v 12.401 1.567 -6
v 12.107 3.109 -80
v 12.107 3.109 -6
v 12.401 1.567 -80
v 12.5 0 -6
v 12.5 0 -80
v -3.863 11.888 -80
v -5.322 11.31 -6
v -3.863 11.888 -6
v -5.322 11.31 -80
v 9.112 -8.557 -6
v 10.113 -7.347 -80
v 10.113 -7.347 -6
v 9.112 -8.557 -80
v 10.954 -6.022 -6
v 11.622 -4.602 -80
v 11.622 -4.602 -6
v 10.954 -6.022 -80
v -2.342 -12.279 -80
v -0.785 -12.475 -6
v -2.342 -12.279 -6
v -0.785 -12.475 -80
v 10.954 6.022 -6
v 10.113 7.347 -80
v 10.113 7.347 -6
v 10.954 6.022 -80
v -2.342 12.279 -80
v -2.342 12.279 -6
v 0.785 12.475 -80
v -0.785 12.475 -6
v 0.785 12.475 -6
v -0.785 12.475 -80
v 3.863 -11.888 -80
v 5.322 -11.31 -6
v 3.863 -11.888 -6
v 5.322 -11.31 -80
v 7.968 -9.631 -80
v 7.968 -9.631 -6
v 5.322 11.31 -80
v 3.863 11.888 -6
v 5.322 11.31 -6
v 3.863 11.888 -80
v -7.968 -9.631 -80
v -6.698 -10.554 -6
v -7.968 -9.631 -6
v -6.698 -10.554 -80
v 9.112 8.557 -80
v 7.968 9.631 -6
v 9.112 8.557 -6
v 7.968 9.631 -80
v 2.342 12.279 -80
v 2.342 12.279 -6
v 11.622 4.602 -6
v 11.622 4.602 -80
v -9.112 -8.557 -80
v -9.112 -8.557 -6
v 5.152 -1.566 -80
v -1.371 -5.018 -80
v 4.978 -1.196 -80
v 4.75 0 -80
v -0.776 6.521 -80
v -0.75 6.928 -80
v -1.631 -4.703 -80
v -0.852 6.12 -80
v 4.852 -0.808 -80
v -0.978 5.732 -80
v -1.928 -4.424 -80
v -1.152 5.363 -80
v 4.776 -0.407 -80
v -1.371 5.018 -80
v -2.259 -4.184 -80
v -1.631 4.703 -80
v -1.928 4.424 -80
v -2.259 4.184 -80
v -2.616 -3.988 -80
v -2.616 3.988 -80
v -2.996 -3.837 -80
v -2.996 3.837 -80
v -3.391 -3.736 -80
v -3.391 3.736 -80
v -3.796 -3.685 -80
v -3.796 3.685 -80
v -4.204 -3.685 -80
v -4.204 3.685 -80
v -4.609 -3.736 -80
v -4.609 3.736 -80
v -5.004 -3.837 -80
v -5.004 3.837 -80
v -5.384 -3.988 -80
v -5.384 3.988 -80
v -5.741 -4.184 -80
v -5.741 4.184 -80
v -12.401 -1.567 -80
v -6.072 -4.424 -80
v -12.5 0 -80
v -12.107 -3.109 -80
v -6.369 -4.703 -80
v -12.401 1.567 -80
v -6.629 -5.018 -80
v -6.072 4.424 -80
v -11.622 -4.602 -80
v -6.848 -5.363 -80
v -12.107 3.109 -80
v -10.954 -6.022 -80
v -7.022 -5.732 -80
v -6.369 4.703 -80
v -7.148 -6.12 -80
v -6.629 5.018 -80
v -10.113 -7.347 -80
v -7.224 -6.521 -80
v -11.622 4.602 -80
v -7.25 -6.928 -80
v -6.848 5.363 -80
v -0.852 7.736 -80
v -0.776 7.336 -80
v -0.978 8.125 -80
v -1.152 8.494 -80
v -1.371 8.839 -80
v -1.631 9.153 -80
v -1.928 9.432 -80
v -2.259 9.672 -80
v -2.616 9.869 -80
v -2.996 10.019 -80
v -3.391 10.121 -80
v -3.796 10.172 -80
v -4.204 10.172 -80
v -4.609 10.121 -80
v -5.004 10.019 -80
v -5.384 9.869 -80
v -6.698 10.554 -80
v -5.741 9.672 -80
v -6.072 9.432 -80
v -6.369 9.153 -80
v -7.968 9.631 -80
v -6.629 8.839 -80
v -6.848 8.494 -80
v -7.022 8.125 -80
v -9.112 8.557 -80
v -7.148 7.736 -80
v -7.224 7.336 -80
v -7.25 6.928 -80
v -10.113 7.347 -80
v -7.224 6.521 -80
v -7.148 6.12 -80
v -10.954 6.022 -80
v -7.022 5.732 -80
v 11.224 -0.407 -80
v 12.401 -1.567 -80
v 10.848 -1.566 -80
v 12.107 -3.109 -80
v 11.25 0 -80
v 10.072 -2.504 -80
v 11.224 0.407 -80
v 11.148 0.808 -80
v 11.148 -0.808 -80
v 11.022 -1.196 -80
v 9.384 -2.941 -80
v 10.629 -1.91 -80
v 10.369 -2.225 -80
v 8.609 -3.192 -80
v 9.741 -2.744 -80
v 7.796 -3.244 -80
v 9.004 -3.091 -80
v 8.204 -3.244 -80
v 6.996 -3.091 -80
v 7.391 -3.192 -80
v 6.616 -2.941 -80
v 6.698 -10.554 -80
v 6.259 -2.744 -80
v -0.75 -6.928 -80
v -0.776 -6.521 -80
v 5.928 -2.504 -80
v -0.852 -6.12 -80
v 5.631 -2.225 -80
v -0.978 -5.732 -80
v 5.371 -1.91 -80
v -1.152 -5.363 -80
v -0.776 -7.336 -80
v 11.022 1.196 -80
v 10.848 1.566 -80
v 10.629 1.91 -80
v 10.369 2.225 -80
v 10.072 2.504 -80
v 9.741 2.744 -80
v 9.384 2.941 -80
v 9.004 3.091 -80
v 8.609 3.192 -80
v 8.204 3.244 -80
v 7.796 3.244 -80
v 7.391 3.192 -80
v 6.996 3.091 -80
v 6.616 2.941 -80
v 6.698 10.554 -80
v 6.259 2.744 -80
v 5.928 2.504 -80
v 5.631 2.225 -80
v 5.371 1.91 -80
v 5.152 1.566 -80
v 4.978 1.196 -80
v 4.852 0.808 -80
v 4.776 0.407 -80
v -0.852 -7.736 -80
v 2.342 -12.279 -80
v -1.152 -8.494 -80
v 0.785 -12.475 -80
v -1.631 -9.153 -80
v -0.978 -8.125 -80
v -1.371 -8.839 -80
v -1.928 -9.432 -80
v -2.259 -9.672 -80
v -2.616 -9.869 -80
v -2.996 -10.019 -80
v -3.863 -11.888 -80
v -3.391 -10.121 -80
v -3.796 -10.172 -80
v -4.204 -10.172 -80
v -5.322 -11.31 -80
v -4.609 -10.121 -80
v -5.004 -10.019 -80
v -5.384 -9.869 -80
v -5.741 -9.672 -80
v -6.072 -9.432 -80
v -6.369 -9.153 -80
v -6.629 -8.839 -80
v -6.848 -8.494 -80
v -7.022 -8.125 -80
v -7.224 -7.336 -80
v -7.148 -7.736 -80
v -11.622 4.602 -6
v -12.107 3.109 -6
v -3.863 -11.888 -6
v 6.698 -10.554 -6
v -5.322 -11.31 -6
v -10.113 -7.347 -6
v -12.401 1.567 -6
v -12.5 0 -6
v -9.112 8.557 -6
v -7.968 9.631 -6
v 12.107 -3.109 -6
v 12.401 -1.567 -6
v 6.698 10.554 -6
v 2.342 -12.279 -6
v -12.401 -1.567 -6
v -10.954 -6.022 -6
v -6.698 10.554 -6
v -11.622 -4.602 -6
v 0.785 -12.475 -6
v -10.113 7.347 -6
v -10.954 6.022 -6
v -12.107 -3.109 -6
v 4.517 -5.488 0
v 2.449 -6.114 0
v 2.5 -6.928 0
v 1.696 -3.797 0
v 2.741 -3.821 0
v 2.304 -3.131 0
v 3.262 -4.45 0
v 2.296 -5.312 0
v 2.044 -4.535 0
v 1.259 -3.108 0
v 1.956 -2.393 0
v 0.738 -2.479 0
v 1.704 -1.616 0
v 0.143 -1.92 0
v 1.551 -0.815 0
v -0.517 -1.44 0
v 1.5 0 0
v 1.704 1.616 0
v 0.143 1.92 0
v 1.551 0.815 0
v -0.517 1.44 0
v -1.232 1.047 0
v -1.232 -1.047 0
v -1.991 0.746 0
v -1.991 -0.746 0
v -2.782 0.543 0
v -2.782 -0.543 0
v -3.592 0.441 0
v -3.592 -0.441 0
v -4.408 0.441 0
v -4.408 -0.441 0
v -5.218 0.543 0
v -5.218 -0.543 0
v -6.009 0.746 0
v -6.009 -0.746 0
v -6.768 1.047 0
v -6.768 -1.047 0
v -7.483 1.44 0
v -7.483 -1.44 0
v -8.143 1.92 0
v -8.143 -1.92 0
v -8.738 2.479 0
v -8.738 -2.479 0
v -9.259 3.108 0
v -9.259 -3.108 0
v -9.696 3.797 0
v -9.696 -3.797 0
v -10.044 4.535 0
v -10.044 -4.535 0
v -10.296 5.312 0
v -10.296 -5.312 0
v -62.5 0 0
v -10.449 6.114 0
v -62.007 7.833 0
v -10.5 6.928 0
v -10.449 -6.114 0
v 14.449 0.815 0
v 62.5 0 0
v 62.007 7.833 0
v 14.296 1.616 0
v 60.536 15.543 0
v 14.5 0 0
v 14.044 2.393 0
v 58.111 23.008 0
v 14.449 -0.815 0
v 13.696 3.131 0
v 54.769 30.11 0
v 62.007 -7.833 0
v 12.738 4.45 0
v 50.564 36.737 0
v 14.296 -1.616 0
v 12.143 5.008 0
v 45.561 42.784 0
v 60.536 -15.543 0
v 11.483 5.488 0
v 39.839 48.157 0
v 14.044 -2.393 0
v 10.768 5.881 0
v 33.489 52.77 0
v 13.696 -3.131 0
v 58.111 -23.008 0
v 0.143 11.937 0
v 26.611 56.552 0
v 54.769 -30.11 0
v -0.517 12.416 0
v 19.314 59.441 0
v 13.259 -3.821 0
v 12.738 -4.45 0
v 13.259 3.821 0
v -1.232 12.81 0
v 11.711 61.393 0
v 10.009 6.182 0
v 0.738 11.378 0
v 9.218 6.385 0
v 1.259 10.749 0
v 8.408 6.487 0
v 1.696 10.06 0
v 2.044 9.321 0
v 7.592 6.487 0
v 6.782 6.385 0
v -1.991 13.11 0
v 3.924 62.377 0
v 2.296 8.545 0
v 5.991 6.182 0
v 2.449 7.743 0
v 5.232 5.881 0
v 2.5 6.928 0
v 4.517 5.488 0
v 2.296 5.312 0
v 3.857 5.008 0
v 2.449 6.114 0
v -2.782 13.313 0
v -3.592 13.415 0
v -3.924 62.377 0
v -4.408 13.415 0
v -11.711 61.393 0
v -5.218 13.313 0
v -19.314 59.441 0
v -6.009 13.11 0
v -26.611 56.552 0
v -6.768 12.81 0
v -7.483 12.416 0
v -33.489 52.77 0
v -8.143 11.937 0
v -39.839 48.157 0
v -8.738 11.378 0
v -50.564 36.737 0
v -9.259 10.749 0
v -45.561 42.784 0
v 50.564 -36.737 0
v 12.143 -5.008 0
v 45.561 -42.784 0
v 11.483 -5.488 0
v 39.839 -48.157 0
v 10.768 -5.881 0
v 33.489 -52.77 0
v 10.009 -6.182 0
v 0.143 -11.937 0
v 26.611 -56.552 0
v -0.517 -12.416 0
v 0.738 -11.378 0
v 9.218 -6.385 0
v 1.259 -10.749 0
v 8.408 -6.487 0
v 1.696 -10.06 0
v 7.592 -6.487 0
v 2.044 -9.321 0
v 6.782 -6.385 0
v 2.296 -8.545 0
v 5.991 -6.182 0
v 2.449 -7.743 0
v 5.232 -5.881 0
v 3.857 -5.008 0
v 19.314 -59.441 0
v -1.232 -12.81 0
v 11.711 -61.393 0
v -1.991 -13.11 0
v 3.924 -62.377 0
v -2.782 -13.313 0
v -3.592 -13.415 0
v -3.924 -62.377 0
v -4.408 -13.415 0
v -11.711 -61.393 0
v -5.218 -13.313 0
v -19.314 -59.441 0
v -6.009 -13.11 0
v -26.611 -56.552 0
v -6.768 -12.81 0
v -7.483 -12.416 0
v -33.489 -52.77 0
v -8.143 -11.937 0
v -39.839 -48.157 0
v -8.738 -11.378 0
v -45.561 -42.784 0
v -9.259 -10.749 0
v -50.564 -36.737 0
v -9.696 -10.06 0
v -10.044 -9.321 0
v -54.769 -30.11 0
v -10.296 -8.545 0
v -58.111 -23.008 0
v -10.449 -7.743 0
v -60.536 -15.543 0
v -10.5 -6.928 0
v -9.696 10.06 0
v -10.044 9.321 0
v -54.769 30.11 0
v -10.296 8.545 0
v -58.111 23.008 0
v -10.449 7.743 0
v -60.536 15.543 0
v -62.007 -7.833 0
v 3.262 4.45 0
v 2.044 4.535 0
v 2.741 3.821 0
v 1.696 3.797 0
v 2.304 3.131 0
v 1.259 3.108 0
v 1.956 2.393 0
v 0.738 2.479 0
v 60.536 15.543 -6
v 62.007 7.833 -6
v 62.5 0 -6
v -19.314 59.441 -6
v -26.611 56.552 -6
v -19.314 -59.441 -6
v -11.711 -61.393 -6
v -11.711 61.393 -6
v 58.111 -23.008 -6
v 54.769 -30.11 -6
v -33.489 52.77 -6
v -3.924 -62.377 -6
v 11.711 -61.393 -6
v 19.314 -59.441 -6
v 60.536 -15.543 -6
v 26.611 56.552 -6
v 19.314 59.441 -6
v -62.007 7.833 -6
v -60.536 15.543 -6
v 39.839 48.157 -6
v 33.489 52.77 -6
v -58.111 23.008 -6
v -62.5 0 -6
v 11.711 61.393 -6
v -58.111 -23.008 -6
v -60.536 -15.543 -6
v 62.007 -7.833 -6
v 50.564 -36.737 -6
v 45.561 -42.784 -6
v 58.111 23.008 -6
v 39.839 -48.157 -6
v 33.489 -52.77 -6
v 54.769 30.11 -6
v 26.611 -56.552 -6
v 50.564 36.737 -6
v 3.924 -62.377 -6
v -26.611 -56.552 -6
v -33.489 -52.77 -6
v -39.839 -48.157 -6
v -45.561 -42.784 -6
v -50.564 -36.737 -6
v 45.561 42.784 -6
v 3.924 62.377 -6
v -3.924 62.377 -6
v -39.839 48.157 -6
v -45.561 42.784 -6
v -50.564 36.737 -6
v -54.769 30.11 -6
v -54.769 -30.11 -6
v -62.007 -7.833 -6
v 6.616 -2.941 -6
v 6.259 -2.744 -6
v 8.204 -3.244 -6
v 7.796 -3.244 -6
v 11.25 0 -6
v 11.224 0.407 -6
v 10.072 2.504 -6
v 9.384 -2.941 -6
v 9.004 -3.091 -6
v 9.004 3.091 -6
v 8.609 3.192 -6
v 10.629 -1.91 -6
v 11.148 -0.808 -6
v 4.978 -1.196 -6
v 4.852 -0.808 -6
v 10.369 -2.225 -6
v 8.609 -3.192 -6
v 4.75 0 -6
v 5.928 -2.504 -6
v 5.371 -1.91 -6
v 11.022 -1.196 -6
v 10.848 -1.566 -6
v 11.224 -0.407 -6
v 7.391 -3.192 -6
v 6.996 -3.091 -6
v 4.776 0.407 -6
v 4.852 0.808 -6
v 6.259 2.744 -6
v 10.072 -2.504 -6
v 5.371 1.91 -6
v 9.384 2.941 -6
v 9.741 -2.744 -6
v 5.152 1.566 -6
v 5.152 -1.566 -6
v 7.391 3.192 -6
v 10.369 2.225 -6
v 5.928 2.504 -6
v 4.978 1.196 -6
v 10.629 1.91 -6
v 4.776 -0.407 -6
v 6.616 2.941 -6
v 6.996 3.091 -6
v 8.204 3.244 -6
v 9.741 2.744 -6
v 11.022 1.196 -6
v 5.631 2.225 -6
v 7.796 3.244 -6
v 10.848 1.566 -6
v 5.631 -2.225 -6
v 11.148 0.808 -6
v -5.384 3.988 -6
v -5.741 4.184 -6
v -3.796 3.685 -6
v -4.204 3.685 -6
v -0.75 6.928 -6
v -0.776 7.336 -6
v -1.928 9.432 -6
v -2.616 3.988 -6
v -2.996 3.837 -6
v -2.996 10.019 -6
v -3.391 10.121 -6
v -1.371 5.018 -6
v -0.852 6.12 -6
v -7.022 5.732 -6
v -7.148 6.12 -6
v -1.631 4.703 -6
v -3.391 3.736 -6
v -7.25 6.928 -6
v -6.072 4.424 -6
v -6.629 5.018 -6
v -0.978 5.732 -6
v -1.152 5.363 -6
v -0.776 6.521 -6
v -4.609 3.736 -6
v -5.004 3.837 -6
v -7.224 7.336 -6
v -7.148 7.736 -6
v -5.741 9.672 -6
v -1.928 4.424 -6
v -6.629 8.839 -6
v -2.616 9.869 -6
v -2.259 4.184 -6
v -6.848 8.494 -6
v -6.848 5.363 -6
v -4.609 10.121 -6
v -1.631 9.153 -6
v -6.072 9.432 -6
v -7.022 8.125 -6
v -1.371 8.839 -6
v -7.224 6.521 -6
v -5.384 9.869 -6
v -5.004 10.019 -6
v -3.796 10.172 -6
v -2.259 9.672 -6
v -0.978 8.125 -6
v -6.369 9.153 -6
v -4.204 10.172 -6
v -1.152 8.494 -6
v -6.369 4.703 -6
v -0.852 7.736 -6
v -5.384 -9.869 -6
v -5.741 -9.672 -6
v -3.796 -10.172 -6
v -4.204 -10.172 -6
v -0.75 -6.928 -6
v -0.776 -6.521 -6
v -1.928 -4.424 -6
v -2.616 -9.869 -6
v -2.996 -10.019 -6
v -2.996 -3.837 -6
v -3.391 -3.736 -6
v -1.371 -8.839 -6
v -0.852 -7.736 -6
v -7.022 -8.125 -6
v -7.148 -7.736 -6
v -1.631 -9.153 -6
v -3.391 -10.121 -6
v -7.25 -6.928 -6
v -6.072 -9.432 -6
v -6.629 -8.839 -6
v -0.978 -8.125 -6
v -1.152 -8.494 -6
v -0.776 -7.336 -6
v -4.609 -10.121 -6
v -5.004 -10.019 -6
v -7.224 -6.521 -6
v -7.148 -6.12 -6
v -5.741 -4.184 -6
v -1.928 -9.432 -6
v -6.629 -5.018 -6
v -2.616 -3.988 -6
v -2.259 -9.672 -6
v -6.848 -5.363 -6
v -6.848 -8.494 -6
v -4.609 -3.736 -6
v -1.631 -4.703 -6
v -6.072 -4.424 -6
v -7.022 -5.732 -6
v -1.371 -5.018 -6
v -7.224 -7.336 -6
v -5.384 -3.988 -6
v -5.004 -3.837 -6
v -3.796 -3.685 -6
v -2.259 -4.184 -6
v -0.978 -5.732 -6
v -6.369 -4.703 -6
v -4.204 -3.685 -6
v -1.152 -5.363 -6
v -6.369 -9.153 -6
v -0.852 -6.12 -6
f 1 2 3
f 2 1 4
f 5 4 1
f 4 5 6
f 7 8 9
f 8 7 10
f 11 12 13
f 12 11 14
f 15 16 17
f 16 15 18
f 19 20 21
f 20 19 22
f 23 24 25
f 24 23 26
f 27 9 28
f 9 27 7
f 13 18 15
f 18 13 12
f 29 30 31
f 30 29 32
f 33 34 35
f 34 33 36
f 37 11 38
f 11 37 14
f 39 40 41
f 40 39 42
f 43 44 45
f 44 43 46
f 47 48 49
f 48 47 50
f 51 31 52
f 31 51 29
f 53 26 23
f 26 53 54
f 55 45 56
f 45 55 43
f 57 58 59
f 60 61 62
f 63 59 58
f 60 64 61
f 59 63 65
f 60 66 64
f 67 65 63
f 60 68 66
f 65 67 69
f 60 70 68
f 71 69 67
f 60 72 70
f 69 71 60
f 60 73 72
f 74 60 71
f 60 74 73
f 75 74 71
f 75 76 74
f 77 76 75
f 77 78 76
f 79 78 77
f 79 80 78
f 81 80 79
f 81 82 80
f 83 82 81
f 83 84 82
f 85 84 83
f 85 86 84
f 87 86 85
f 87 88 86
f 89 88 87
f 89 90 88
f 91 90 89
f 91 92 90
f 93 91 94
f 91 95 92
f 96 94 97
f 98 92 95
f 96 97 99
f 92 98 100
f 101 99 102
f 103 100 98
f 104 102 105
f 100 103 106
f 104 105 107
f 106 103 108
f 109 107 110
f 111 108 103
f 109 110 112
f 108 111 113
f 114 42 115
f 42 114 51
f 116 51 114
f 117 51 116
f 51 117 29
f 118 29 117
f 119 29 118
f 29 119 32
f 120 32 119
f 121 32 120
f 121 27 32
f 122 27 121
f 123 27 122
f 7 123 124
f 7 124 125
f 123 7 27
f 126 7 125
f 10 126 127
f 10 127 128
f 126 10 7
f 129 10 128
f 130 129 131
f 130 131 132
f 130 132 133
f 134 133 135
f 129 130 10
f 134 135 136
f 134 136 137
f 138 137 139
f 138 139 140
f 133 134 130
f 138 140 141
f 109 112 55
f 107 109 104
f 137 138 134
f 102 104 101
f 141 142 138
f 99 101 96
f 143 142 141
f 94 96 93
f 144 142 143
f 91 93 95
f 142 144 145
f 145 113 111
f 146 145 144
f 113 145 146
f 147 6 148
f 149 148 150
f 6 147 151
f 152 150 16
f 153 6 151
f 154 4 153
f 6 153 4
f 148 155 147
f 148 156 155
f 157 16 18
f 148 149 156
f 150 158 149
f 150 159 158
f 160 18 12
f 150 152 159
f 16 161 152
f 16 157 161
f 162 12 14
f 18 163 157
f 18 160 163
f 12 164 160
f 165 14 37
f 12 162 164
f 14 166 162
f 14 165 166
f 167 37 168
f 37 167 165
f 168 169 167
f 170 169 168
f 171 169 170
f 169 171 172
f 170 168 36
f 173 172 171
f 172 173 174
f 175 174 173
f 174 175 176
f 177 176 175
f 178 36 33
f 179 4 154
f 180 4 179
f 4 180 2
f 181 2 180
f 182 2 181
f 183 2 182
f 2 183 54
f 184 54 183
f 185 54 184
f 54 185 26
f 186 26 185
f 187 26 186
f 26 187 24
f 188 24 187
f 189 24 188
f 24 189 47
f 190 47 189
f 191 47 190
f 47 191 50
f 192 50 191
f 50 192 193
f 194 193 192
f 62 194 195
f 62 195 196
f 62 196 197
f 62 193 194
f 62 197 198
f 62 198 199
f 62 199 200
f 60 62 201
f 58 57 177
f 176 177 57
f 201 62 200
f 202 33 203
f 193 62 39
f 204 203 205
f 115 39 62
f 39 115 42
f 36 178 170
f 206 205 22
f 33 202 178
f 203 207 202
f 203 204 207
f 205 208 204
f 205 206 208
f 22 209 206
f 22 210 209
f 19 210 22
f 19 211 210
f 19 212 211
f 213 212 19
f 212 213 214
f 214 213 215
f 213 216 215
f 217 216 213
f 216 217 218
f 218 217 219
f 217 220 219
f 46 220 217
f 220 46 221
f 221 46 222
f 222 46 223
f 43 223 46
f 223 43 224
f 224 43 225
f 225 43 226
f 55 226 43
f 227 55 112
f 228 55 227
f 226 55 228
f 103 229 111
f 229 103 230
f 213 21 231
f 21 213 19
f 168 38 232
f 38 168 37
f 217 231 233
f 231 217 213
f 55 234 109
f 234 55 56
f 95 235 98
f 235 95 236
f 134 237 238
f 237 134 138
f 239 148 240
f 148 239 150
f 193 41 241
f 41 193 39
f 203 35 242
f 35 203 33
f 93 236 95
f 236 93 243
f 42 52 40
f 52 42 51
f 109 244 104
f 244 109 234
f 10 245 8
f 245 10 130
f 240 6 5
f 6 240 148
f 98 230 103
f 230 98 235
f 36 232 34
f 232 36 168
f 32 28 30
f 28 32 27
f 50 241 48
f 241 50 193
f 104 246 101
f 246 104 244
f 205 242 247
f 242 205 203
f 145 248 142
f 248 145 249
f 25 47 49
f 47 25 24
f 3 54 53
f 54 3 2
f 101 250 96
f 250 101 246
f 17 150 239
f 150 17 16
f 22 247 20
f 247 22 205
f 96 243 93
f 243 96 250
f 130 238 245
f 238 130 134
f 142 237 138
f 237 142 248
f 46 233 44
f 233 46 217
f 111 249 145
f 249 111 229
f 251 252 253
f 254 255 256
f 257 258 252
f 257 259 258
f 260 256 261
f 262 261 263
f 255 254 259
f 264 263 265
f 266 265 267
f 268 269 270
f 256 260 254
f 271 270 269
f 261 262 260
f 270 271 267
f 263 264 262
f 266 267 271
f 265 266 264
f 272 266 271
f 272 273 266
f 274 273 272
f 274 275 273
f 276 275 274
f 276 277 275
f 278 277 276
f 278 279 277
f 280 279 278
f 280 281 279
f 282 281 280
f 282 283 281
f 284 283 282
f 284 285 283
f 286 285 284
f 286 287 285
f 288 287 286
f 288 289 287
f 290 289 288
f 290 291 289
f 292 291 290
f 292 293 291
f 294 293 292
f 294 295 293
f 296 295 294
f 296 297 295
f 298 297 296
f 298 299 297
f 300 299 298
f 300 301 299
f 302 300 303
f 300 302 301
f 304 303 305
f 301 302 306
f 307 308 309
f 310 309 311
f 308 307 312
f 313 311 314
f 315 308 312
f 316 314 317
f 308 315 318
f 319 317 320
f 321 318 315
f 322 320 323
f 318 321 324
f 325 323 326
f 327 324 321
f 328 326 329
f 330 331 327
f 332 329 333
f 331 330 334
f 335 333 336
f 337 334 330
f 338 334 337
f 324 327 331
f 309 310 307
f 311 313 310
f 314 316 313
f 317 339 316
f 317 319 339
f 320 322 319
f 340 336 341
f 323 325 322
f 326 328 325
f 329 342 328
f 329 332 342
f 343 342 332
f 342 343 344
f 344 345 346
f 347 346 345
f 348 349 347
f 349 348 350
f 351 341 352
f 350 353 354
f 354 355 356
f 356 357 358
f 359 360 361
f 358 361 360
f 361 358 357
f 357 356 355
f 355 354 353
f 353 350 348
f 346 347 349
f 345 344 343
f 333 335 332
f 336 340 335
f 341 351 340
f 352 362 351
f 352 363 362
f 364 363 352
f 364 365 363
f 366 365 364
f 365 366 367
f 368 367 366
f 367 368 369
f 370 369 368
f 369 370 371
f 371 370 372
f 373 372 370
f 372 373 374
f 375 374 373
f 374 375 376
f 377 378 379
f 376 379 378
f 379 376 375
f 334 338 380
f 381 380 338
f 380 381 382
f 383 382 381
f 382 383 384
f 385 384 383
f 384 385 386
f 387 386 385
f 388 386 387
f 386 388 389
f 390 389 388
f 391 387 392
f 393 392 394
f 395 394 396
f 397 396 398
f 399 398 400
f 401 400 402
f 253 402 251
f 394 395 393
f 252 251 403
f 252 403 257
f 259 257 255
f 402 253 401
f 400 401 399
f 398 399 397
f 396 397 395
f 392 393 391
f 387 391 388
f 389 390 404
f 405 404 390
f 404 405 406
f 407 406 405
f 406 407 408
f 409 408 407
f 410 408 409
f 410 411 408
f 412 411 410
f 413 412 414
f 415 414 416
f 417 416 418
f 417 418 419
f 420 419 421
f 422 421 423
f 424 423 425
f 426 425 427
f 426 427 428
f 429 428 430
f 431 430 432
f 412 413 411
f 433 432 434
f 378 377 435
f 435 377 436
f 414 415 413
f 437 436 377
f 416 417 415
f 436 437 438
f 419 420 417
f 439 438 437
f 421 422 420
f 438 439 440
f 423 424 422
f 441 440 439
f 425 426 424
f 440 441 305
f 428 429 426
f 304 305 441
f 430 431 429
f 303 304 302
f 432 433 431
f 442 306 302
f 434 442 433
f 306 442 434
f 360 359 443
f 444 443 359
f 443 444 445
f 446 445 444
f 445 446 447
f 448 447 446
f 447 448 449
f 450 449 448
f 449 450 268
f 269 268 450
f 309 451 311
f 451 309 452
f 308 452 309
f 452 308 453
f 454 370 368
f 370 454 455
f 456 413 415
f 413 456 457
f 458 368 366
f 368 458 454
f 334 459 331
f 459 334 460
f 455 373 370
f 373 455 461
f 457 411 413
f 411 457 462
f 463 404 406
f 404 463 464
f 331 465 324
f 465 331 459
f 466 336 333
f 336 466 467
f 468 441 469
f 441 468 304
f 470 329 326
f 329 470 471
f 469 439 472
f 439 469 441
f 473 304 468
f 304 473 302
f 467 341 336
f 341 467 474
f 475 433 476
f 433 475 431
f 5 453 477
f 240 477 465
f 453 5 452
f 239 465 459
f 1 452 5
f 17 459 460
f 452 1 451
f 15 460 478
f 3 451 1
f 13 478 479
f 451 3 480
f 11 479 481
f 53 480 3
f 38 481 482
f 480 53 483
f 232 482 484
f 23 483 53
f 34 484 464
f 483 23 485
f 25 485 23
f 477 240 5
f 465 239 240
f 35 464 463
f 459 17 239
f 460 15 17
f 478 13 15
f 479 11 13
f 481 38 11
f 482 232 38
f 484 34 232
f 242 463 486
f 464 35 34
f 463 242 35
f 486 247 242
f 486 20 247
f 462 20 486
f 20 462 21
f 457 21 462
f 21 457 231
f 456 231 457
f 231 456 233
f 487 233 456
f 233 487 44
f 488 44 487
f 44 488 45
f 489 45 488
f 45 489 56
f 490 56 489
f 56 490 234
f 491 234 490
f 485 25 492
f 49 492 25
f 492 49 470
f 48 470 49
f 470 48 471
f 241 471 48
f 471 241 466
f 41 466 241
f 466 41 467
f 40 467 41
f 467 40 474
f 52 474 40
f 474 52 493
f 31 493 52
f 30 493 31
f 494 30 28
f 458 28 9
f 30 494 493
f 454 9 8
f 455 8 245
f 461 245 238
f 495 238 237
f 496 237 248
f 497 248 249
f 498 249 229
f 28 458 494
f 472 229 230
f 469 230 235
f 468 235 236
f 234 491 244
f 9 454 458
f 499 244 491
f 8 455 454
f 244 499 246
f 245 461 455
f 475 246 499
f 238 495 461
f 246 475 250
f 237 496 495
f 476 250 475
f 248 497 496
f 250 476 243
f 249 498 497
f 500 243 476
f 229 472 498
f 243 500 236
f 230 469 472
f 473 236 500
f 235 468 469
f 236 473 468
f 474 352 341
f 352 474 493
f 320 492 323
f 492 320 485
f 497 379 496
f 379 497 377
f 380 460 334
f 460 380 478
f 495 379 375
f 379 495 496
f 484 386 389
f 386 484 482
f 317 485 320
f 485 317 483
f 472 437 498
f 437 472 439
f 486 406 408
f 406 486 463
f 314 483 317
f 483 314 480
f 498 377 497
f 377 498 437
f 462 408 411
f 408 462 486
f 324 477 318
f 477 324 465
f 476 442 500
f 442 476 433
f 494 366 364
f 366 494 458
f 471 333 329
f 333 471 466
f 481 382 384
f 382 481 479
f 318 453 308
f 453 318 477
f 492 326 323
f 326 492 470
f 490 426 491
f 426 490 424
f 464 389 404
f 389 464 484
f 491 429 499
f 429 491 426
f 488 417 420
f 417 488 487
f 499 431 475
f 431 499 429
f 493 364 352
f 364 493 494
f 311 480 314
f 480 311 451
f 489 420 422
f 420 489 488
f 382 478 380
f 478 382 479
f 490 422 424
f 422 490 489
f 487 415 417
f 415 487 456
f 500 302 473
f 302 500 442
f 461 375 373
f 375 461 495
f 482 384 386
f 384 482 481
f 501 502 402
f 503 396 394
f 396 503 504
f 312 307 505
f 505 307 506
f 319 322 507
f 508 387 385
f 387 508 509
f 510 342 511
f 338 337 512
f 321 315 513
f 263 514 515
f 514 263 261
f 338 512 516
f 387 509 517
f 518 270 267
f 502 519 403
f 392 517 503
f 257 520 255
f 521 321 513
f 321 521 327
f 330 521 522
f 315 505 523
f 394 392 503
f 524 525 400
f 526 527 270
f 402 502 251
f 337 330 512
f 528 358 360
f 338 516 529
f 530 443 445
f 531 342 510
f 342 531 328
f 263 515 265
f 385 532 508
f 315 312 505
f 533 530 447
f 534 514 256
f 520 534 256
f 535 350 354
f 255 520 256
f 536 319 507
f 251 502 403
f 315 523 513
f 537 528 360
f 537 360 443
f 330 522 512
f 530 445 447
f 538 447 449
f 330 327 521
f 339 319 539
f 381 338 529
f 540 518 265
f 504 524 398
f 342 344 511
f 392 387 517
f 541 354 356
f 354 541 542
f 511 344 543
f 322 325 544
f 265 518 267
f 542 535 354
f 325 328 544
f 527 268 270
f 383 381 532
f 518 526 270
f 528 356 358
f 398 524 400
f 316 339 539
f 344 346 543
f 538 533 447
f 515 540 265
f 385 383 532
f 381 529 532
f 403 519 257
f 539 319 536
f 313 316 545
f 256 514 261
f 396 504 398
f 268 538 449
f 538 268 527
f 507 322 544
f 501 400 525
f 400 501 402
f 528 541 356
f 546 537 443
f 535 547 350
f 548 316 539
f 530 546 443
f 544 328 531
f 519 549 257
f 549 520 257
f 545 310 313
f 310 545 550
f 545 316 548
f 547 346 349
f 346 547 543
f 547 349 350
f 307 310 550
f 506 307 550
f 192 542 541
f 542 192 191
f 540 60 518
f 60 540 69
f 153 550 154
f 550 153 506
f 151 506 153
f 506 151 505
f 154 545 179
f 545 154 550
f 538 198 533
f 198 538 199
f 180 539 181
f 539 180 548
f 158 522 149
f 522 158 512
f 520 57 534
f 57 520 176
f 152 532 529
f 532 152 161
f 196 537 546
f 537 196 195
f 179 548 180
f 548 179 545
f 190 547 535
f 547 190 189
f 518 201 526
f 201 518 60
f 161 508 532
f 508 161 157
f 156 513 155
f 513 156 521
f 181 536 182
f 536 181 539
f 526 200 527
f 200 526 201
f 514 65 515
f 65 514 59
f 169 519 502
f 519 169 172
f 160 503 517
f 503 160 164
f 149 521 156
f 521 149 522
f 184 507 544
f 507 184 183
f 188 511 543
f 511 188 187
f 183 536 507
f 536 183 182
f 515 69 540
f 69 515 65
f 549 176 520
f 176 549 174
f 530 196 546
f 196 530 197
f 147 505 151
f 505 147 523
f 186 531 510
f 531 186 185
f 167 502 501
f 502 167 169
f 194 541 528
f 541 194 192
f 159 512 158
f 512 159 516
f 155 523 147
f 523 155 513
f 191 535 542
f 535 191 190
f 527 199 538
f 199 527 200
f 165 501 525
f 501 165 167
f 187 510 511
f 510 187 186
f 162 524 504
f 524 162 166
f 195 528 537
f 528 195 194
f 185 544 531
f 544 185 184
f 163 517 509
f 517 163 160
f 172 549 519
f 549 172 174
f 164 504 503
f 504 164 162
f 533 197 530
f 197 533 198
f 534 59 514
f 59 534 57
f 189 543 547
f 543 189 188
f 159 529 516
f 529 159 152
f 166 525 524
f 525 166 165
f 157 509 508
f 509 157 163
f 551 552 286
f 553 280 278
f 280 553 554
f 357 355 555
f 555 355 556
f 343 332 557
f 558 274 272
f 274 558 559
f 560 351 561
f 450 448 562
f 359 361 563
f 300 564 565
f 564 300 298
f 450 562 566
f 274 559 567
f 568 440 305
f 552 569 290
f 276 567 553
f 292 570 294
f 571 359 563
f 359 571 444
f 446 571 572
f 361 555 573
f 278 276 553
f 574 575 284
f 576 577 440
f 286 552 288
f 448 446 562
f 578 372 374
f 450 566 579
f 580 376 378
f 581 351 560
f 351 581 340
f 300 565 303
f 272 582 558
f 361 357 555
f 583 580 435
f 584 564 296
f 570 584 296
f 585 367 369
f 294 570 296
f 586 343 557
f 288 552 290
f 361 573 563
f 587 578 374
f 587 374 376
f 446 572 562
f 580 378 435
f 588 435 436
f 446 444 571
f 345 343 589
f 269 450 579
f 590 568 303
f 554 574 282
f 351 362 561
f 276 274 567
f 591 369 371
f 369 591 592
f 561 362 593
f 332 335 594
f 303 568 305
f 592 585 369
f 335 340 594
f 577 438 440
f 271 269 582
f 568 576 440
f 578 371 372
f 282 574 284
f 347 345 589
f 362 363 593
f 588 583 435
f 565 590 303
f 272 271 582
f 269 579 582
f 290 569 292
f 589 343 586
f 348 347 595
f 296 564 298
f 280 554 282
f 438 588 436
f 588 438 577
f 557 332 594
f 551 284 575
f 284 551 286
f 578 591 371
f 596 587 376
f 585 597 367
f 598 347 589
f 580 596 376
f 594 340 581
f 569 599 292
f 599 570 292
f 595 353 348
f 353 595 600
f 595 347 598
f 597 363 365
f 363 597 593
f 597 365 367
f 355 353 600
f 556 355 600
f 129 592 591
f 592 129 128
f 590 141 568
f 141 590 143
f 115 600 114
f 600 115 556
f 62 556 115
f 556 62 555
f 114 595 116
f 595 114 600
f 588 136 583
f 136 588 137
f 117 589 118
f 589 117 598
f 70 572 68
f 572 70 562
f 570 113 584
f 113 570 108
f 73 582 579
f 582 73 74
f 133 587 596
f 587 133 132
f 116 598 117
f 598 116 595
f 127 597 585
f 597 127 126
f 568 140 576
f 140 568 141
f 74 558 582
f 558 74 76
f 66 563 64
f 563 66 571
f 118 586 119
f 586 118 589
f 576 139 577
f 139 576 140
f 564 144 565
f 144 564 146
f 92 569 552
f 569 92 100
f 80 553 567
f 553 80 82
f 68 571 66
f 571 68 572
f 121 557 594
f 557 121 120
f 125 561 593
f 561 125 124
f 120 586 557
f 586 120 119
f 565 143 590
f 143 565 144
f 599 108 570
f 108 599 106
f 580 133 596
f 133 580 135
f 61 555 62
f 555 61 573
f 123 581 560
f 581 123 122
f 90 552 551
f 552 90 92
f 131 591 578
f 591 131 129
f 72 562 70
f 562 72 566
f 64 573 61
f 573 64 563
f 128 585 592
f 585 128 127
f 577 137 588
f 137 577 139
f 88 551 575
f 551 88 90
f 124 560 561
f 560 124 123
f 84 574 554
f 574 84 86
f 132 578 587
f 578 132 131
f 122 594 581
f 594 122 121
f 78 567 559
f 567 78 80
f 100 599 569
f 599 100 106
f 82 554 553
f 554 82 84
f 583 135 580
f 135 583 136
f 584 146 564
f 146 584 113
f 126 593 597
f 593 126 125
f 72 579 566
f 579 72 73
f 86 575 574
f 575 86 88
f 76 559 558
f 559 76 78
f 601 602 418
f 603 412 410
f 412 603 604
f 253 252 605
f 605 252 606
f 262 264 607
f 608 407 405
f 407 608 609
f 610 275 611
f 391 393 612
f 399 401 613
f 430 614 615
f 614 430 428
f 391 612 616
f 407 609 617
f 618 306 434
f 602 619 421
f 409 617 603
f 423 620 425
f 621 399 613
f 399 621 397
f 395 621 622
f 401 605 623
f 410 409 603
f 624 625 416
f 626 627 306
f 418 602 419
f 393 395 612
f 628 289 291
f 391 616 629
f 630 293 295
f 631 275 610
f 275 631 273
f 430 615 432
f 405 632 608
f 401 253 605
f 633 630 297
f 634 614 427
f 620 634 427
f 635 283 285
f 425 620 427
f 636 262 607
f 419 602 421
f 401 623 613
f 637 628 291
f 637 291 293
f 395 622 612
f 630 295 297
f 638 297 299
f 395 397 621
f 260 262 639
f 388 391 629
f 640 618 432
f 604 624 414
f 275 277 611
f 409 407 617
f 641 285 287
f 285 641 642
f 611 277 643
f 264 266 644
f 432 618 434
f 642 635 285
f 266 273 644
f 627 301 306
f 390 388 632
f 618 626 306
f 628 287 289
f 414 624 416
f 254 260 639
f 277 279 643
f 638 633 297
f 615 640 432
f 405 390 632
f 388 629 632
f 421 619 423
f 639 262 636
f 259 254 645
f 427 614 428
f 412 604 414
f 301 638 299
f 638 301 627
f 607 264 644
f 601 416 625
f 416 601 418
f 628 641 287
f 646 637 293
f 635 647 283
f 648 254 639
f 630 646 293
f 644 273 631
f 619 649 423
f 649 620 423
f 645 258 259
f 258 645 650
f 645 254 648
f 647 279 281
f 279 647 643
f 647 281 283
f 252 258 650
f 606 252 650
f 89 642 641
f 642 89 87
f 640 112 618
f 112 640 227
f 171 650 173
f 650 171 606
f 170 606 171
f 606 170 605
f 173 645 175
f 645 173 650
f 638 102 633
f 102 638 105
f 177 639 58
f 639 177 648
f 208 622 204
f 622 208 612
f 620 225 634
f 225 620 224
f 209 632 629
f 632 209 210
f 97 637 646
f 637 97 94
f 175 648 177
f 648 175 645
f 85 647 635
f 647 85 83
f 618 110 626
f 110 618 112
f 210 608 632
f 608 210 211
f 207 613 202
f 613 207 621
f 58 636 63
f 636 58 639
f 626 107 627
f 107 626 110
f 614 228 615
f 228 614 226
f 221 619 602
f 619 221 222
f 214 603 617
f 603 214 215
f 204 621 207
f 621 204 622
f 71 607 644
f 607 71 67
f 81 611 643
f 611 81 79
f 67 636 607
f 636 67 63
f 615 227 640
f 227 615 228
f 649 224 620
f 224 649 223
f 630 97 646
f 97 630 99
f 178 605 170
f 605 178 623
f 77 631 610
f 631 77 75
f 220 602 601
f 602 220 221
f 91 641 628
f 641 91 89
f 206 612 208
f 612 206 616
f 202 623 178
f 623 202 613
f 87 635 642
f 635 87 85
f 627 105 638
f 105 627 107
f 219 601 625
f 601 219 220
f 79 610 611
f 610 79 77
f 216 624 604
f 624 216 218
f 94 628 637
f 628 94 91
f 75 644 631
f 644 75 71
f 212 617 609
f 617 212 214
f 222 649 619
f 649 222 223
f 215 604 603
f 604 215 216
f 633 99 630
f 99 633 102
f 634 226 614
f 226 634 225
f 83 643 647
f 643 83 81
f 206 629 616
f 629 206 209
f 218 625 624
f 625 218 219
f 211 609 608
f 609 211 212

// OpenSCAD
$fn = 50;


difference() {
	union() {
		translate(v = [0, 0, -80.0000000000]) {
			cylinder(h = 80, r = 12.5000000000);
		}
		translate(v = [0, 0, -6.0000000000]) {
			cylinder(h = 6, r = 62.5000000000);
		}
	}
	union() {
		translate(v = [8.0000000000, 0.0000000000, 0]) {
			rotate(a = [0, 0, 0]) {
				difference() {
					union() {
						#translate(v = [0, 0, -80.0000000000]) {
							cylinder(h = 80, r = 2.2500000000);
						}
						#translate(v = [0, 0, -6]) {
							cylinder(h = 6, r = 12.5000000000, r1 = 3.2500000000, r2 = 6.5000000000);
						}
						#translate(v = [0, 0, -80.0000000000]) {
							cylinder(h = 80, r = 3.2500000000);
						}
						#translate(v = [0, 0, -80.0000000000]) {
							cylinder(h = 80, r = 2.2500000000);
						}
					}
					union();
				}
			}
		}
		translate(v = [-4.0000000000, 6.9282032303, 0]) {
			rotate(a = [0, 0, 0]) {
				difference() {
					union() {
						#translate(v = [0, 0, -80.0000000000]) {
							cylinder(h = 80, r = 2.2500000000);
						}
						#translate(v = [0, 0, -6]) {
							cylinder(h = 6, r = 12.5000000000, r1 = 3.2500000000, r2 = 6.5000000000);
						}
						#translate(v = [0, 0, -80.0000000000]) {
							cylinder(h = 80, r = 3.2500000000);
						}
						#translate(v = [0, 0, -80.0000000000]) {
							cylinder(h = 80, r = 2.2500000000);
						}
					}
					union();
				}
			}
		}
		translate(v = [-4.0000000000, -6.9282032303, 0]) {
			rotate(a = [0, 0, 0]) {
				difference() {
					union() {
						#translate(v = [0, 0, -80.0000000000]) {
							cylinder(h = 80, r = 2.2500000000);
						}
						#translate(v = [0, 0, -6]) {
							cylinder(h = 6, r = 12.5000000000, r1 = 3.2500000000, r2 = 6.5000000000);
						}
						#translate(v = [0, 0, -80.0000000000]) {
							cylinder(h = 80, r = 3.2500000000);
						}
						#translate(v = [0, 0, -80.0000000000]) {
							cylinder(h = 80, r = 2.2500000000);
						}
					}
					union();
				}
			}
		}
	}
}
